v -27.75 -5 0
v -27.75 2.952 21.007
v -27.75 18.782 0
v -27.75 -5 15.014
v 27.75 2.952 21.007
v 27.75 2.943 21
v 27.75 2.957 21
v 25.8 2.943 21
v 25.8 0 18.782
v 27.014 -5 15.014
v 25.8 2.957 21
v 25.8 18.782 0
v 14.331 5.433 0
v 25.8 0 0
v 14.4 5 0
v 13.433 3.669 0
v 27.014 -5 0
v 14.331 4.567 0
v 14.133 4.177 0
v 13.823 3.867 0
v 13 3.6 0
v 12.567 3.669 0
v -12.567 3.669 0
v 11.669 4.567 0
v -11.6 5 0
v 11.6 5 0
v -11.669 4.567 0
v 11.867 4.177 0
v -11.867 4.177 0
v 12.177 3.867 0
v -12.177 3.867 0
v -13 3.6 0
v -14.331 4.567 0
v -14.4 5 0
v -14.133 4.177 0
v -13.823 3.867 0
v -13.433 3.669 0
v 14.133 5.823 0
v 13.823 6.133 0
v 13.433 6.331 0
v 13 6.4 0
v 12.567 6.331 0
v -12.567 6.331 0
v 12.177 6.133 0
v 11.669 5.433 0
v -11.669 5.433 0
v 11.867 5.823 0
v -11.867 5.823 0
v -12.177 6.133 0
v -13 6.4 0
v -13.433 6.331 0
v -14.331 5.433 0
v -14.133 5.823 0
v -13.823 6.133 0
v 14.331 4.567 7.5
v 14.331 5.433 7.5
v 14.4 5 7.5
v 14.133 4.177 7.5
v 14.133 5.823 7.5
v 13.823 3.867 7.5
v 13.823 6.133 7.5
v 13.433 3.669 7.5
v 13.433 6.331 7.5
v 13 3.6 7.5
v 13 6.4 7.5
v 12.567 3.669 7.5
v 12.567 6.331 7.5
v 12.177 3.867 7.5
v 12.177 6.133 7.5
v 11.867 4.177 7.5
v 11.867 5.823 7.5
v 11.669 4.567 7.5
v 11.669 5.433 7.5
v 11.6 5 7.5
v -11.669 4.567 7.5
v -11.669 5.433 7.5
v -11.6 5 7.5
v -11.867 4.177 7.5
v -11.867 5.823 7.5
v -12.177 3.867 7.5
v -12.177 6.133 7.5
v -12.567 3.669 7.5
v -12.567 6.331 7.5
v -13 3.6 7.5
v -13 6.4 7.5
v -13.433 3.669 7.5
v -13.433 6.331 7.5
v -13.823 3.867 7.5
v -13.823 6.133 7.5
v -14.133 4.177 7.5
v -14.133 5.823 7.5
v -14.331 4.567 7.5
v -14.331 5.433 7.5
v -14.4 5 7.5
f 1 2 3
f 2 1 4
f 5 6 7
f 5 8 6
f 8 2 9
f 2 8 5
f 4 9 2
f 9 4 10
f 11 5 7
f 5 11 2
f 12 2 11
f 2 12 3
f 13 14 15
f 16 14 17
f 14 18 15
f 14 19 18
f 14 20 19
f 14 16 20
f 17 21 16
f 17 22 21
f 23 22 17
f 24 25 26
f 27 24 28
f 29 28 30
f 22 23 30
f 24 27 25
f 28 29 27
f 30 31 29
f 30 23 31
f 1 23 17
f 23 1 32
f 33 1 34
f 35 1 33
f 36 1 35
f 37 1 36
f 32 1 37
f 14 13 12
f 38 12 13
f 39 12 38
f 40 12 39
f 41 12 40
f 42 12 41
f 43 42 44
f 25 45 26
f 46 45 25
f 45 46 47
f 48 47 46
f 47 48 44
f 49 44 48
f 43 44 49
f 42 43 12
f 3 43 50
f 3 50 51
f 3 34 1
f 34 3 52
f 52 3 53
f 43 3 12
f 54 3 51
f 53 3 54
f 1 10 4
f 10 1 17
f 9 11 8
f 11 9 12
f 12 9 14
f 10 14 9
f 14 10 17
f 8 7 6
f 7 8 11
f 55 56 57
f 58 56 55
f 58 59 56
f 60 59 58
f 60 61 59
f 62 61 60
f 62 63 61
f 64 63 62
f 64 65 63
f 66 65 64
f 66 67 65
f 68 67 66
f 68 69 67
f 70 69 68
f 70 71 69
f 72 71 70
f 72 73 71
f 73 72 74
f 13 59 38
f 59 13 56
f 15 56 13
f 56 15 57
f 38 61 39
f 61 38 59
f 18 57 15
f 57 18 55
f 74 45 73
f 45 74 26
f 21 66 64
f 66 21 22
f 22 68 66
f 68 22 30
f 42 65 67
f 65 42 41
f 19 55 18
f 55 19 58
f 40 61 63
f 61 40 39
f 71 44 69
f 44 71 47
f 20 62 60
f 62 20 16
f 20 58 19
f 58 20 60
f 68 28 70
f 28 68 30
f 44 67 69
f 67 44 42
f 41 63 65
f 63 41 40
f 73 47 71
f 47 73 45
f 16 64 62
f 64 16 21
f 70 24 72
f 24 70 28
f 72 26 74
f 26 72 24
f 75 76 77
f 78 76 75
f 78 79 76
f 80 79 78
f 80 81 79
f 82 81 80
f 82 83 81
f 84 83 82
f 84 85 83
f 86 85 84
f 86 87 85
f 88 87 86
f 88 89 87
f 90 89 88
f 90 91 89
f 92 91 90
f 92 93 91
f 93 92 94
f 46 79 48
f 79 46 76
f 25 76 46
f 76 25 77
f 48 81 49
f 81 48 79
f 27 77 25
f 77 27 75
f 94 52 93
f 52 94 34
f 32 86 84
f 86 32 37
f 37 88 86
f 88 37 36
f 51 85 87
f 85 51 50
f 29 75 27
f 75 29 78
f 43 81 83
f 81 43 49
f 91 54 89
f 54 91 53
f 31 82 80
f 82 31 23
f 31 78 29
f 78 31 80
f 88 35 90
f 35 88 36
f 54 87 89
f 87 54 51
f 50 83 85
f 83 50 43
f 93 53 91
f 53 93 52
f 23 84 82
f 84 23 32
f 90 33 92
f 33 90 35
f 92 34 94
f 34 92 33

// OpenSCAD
// file: ../../Dollo/New_long_ties/globals.scad
/*
Most things in this file is represented as one millimeter, so keep that in mind while changing things.
Some of the setting are not mm but at variables that you can set, such as 2*x=2x and you are setting what x is.
I will try to specify when things are variables and not exact measurements.
*/

// printer slop
slop = 0.15;

obj_leg = 30;
leg_length = 5.5;
small_number = 0.001;
metal_core_rode_global = 5;


///////////////// number of holes /////////////////////
z_hole_number = 8;
other_holes = 8;

///////////////// Pins /////////////////////

//pins that poke out
ball_size = 10;
pin_height = 20;
pin_diameter = 6;


//holes
hole_ball_size = ball_size;
hole_pin_height = pin_height;
hole_pin_diameter = pin_diameter;

///////////////// Z THINGS /////////////////////

berring_slot_width = 7.5;
berring_slot_depth = 6.5;
metal_core_rode = 5;

///////////////// X THINGS /////////////////////

//male dove tails
male_dove_max_width=8;
male_dove_min_width=5;
male_dove_depth=5;
male_dove_height=obj_leg/2;

function scaled_male_dove_max_width() = male_dove_max_width - slop;
function scaled_male_dove_min_width() = male_dove_min_width - slop;
function scaled_male_dove_depth() = male_dove_depth - slop;

//female dove tails, this is found on the y mounts
girl_max_width=11;
girl_min_width=5;
girl_depth=5;
girl_height=obj_leg;


///////////////// Y THINGS /////////////////////
/*
The Y is so normal that all of those global variables at the top should change all of the setting in it, this section is set her incase there are variables set in the future development of this project.
*/

// stepper
motor_side_length = 43.2;
motor_bolt_hole_distance = 31;
motor_center_hole = 23;
motor_shaft_dia = 5;
motor_shaft_hole_dia = 5+2*slop;

// bolts etc.
bolt_hole_dia = 3+2*slop;
bolt_head_hole_dia = 5.8;

m4_bolt_hole_dia = 4+2*slop;
m4_bolt_head_hole_dia = 6.8+2*slop;


m3_nut_side = 5.65;
m3_nut_height = 2.3;
m4_nut_side = 6.85;
m4_nut_height = 3.1;

// threaded rod
lifter_rod_diam = 9.86;
hole_threaded_rod = lifter_rod_diam+2*slop;

// for the extensions
metal_rod_size = 9;
// main file
use <../../Dollo/New_long_ties/include.scad>;

////// VARIABLES \\\\\\

w = 60;
h = 70;
l = 50;
wall = 2;
slop = 0.1;
ear_d = 17;
slide = 3;
slope = 1;


////// VIEW \\\\\\
//debug();


//bucket();
//bucket_bottom();
//bucket_mount();
//bucket_arm();
//bucket_centering_peg();
//bucket_wipe_lip_mount();
bucket_filament_slope();


////// MODULES \\\\\\
module debug() {
    intersection() {
        bucket();

        translate([200/2, 0, 0])
        cube([200, 200, 200], center=true);
    }

//    translate([wall/2, -5/2, -h/2 + 3/2])
//    bucket_bottom();

//    %translate([
//        w/2 + 15/2 - wall - 3, l/2 - 15/2 - 2, h/2 - 19.5
//    ])
//    _mock_brush();

    // wipe lip
    translate([
        w/2 - 3, l/2 - 15/2 - 1.2, h/2 - 10
    ])
    cube([1.8, 17, 19], center=true);

    translate([
        w/2 + 5.5, 16, 23
    ])
    bucket_wipe_lip_mount();

    translate([0, 23, 7])
    rotate([90, 0, 0])
    bucket_filament_slope();
}

module _rail(length=l) {
    intersection() {
        rotate([45, 0, 0])
        cube([length, 1, 1], center=true);

        translate([0, 1/2 - 0.01, 0])
        cube([length, 1, 2], center=true);
    }
}

module _bucket_form(w=w, l=l, h=h) {
    union() {
        hull() {
            translate([0, 0, h/2 - 5/2])
            cube([w, l, 5], center=true);

            translate([0, 0, 0.1/2])
            cube([w, l, 0.1], center=true);
        }

        hull() {
            translate([0, 0, 0.1/2])
            cube([w, l, 0.1], center=true);

            translate([0, -slope/2, -h/2 + 5/2])
            cube([w, l - slope, 5], center=true);
        }
    }
}

module _holee(length) {
    hull() {
        translate([0, -length/2, 0])
        cylinder(d=4.3, h=20, center=true, $fn=40);

        translate([0, length/2, 0])
        cylinder(d=4.3, h=20, center=true, $fn=40);
    }
}

module _ear(nut=true) {
    difference() {
        hull() {
            rotate([0, 90, 0])
            cylinder(d=ear_d, h=8, center=true, $fn=30);
            translate([0, ear_d/2, -(ear_d*1.5)/2 + ear_d/2])
            cube([8, 0.1, ear_d*1.5], center=true);
        }
        translate([0, 0, 0])
        rotate([0, -90, 0]) {
            if(nut) M4_nut(7);
            cylinder(d=4.3, h=10, center=true, $fn=40);
        }

        translate([8/2 - 3/2, 0, 0])
        difference() {
            translate([5/2, 0, 0])
            cube([5, 50, 100], center=true);
            rotate([0, 0, 45])
            cube([slide, slide, 105], center=true);
        }
    }
}

module _centering_peg_hole() {
    cube([6.2, 20.2, 5], center=true);
}

module _wipe_silicone_slot() {
    difference() {
        union() {
            intersection() {
                translate([w/2 - wall - 5, l/2 - 20/2, h/2])
                hull() {
                    cube([2*wall + 2, 20, 21], center=true);

                    translate([0, 20/2, -35])
                    cube([2*wall + 2, 1, 0.2], center=true);
                }
                _bucket_form();
            }
            translate([
                w/2 - wall - 5/2, l/2 - 20 + 1/2, h/2 - 10/2
            ])
            cube([5.1, 1, 10], center=true);
        }
        translate([
            w/2 - wall - 5, l/2 - wall - (20 - 2*wall)/2,
            h/2 - 10/2 + 1
        ])
        cube([2, 20 - 2*wall, 10], center=true);
    }
}

module _wipe_PTFE_slot() {
    intersection() {
        translate([
            w/2 - wall - 4/2 - 0.3, l/2 - 7/2, h/2 - 22
        ])
        difference() {
            translate([4/2 - 1, 0, 24/2 - 4])
            cube([4, 7, 24], center=true);
            intersection() {
                cylinder(d=4.4, h=20, $fn=20);

                translate([8/2, 0, 21/2])
                cube([8, 8, 21], center=true);
            }
            translate([1, 0, -4])
            rotate([0, 45, 0])
            cube([15, 8, 4], center=true);

            translate([0, 0, 21])
            rotate([0, -45, 0])
            cube([10, 8, 1], center=true);
        }
        _bucket_form();
    }
}

module _wipe_slot() {
    difference() {
        hull() {
            cube([15, 15, 1], center=true);

            translate([-15/2 + 1/2 + 3, 0, -20/2 - 10/2])
            cube([1, 12, 20], center=true);
        }
        translate([0, 0, -0.3])
        hull() {
            translate([13, 0, 0])
            cube([1, 3.4, 5], center=true);

            cylinder(d=3.4, h=5, center=true, $fn=40);
        }
        translate([0, 0, -13])
        hull() {
            translate([13, 0, 0])
            cube([1, 7, 20], center=true);

            cylinder(d=7, h=20, center=true, $fn=40);
        }
    }
}

module _mock_brush() {
    color("black")
    hull() {
        translate([0, 0, 1/2])
        cube([12, 12, 1], center=true);

        translate([0, 0, 8 - 1/2])
        cube([12, 12, 1], center=true);
    }
    color("grey")
    translate([0, 0, 8 + 11.8/2])
    cube([10, 10, 11.8], center=true);
}

module bucket() {
    difference() {
        union() {
            difference() {
                _bucket_form();

                translate([0, 0, -0.05])
                _bucket_form(w - 2*wall, l - 2*wall, h + 0.2);
            }

            translate([
                -8/2 - 10/2 + 3/2, -l/2 - ear_d/2, h/2 - 15
            ])
            _ear(nut=true);

            translate([
                8/2 + 10/2 - 3/2, -l/2 - ear_d/2, h/2 - 15
            ])
            mirror([1, 0, 0])
            _ear(nut=false);

            translate([-w/2, -slope/2, -h/2 + 3/2])
            rotate([0, 0, 90])
            _rail(l - slope);

            translate([w/2, -slope/2, -h/2 + 3/2])
            rotate([0, 0, -90])
            _rail(l - slope);
        }

        // entry slot
        translate([0, l/2, h/2 - 2])
        hull() {
            cube([3, 3*wall, 1], center=true);

            translate([0, 0, 3])
            cube([6, 3*wall, 1], center=true);
        }
        
        // wipe slot
        translate([w/2, l/2 - 17/2, h/2 - 20 + 27/2])
        cube([2*wall + 4, 17 + wall, 28], center=true);
    }
    translate([
        w/2 + 15/2 - wall - 2, l/2 - 15/2 - 2, h/2 - 20
    ])
    _wipe_slot();


}

module bucket_bottom() {
    difference() {
        union() {
            cube([
                w - wall - slop, l - 2*wall - slop - 5, 3
            ], center=true);

            translate([(w - wall - slop)/2, 0, 0])
            intersection() {
                donut(30, 4, $fn=80);
                cube([40, 40, 3], center=true);
            }
        }
        translate([0, -l/2 + wall + 2/2, 0])
        scale([1, 1.08, 1.08])
        _rail();

        translate([0, l/2 - wall - 2/2, 0])
        scale([1, 1.08, 1.08])
        mirror([0, 1, 0])
        _rail();

        translate([-w/2 + wall/2, 0, 0])
        rotate([0, 0, -90])
        scale([1, 1.08, 1.08])
        _rail();

        translate([0, 0, 10/2])
        chamfered_cube(w - 2, l - 3 - 5, 10, 2, center=true);
    }
}

module bucket_mount() {
    difference() {
        union() {
            rounded_cube_side(52, 20, 5, 6, center=true);

            translate([0, -3, 0])
            rounded_cube_side(23, 32, 5, 6, center=true);

            translate([-8/2 - 10/2 + 3/2, 2, ear_d/2 + 5/2])
            rotate([-90, 0, 0])
            _ear();

            translate([8/2 + 10/2 - 3/2, 2, ear_d/2 + 5/2])
            rotate([-90, 0, 0])
            mirror([1, 0, 0])
            _ear();

        }
        translate([50/2 - 5, 0, 0])
        cylinder(d=4.3, h=10, center=true, $fn=50);

        translate([-50/2 + 5, 0, 0])
        cylinder(d=4.3, h=10, center=true, $fn=50);

        translate([0, 0, -3.4])
        rotate([0, 0, 90])
        _centering_peg_hole();
    }
}

module bucket_arm() {
    arm_h = 10;

    difference() {
        union() {
            hull() {
                translate([0, -10, 0])
                cylinder(d=ear_d, h=arm_h, center=true, $fn=50);

                cylinder(d=ear_d, h=arm_h, center=true, $fn=50);
            }
            hull() {
                cylinder(d=ear_d, h=arm_h, center=true, $fn=50);

                translate([25, 10, 0])
                cube([1, ear_d, arm_h], center=true);
            }
            translate([25, 10, 0])
            hull() {
                cube([0.1, ear_d, arm_h], center=true);

                translate([30, 0, 0])
                cylinder(d=ear_d, h=arm_h, center=true, $fn=50);
            }
        }
        translate([0, -10/2, 0])
        _holee(10);

        translate([25 + 30/2, 10, 0])
        rotate([0, 0, 90])
        _holee(30);

        translate([0, 0, -10/2])
        rotate([0, 45, 0])
        cube([slide, 50, slide], center=true);

        translate([0, 0, 10/2])
        rotate([0, 45, 0])
        cube([slide, 50, slide], center=true);

        translate([0, 10, -10/2])
        rotate([45, 0, 0])
        cube([150, slide, slide], center=true);

        translate([0, 10, 10/2])
        rotate([45, 0, 0])
        cube([150, slide,slide], center=true);

        // infill
        translate([15, 5, 0])
        rotate([0, 0, 22])
        cube([30, 0.1, 0.2], center=true);

        translate([25, 5, 0])
        cube([80, 0.1, 0.2], center=true);

        translate([25, 15, 0])
        cube([80, 0.1, 0.2], center=true);
    }
}

module bucket_centering_peg() {
    translate([0, 0, 5/2])
    cube([6, 20, 5], center=true);
}

module wipe_spacer() {
    difference() {
        cube([10, 12, 3], center=true);
        cylinder(d=3.3, h=5, center=true, $fn=30);
    }
}

module bucket_wipe_lip_mount() {
    // bottom
    difference() {
        cube([15, 17, 15], center=true);

        translate([30/2 - 1, 0, 30/2 - 1])
        chamfered_cube(
            30, 30, 30, 3, center=true
        );

        translate([1, -0.5])
        cylinder(d=2.8, h=40, center=true, $fn=20);

        translate([0, -5, 0])
        rotate([0, 90, 0])
        cylinder(d=2.8, h=40, center=true, $fn=20);

        translate([0, 4.2, 0])
        rotate([0, 90, 0])
        cylinder(d=2.8, h=40, center=true, $fn=20);
    }
}

module bucket_filament_slope() {
    difference() {
        rotate([37, 0, 0])
        cube([w - 2*wall - 0.5, 30, 30], center=true);

        translate([0, 0, -30/2])
        cube([100, 100, 30], center=true);

        translate([0, -30/2 - 5, 0])
        cube([100, 30, 100], center=true);

        hull() {
            translate([w/2 - wall, 10, 0])
            cube([4.4, 20, 42], center=true);

            translate([w/2 - wall, -2, 0])
            cube([1, 10, 42], center=true);
        }
        

        translate([13, 5, 0])
        cylinder(d=2.8, h=15, center=true, $fn=20);

        translate([-13, 5, 0])
        cylinder(d=2.8, h=15, center=true, $fn=20);

    }
}
